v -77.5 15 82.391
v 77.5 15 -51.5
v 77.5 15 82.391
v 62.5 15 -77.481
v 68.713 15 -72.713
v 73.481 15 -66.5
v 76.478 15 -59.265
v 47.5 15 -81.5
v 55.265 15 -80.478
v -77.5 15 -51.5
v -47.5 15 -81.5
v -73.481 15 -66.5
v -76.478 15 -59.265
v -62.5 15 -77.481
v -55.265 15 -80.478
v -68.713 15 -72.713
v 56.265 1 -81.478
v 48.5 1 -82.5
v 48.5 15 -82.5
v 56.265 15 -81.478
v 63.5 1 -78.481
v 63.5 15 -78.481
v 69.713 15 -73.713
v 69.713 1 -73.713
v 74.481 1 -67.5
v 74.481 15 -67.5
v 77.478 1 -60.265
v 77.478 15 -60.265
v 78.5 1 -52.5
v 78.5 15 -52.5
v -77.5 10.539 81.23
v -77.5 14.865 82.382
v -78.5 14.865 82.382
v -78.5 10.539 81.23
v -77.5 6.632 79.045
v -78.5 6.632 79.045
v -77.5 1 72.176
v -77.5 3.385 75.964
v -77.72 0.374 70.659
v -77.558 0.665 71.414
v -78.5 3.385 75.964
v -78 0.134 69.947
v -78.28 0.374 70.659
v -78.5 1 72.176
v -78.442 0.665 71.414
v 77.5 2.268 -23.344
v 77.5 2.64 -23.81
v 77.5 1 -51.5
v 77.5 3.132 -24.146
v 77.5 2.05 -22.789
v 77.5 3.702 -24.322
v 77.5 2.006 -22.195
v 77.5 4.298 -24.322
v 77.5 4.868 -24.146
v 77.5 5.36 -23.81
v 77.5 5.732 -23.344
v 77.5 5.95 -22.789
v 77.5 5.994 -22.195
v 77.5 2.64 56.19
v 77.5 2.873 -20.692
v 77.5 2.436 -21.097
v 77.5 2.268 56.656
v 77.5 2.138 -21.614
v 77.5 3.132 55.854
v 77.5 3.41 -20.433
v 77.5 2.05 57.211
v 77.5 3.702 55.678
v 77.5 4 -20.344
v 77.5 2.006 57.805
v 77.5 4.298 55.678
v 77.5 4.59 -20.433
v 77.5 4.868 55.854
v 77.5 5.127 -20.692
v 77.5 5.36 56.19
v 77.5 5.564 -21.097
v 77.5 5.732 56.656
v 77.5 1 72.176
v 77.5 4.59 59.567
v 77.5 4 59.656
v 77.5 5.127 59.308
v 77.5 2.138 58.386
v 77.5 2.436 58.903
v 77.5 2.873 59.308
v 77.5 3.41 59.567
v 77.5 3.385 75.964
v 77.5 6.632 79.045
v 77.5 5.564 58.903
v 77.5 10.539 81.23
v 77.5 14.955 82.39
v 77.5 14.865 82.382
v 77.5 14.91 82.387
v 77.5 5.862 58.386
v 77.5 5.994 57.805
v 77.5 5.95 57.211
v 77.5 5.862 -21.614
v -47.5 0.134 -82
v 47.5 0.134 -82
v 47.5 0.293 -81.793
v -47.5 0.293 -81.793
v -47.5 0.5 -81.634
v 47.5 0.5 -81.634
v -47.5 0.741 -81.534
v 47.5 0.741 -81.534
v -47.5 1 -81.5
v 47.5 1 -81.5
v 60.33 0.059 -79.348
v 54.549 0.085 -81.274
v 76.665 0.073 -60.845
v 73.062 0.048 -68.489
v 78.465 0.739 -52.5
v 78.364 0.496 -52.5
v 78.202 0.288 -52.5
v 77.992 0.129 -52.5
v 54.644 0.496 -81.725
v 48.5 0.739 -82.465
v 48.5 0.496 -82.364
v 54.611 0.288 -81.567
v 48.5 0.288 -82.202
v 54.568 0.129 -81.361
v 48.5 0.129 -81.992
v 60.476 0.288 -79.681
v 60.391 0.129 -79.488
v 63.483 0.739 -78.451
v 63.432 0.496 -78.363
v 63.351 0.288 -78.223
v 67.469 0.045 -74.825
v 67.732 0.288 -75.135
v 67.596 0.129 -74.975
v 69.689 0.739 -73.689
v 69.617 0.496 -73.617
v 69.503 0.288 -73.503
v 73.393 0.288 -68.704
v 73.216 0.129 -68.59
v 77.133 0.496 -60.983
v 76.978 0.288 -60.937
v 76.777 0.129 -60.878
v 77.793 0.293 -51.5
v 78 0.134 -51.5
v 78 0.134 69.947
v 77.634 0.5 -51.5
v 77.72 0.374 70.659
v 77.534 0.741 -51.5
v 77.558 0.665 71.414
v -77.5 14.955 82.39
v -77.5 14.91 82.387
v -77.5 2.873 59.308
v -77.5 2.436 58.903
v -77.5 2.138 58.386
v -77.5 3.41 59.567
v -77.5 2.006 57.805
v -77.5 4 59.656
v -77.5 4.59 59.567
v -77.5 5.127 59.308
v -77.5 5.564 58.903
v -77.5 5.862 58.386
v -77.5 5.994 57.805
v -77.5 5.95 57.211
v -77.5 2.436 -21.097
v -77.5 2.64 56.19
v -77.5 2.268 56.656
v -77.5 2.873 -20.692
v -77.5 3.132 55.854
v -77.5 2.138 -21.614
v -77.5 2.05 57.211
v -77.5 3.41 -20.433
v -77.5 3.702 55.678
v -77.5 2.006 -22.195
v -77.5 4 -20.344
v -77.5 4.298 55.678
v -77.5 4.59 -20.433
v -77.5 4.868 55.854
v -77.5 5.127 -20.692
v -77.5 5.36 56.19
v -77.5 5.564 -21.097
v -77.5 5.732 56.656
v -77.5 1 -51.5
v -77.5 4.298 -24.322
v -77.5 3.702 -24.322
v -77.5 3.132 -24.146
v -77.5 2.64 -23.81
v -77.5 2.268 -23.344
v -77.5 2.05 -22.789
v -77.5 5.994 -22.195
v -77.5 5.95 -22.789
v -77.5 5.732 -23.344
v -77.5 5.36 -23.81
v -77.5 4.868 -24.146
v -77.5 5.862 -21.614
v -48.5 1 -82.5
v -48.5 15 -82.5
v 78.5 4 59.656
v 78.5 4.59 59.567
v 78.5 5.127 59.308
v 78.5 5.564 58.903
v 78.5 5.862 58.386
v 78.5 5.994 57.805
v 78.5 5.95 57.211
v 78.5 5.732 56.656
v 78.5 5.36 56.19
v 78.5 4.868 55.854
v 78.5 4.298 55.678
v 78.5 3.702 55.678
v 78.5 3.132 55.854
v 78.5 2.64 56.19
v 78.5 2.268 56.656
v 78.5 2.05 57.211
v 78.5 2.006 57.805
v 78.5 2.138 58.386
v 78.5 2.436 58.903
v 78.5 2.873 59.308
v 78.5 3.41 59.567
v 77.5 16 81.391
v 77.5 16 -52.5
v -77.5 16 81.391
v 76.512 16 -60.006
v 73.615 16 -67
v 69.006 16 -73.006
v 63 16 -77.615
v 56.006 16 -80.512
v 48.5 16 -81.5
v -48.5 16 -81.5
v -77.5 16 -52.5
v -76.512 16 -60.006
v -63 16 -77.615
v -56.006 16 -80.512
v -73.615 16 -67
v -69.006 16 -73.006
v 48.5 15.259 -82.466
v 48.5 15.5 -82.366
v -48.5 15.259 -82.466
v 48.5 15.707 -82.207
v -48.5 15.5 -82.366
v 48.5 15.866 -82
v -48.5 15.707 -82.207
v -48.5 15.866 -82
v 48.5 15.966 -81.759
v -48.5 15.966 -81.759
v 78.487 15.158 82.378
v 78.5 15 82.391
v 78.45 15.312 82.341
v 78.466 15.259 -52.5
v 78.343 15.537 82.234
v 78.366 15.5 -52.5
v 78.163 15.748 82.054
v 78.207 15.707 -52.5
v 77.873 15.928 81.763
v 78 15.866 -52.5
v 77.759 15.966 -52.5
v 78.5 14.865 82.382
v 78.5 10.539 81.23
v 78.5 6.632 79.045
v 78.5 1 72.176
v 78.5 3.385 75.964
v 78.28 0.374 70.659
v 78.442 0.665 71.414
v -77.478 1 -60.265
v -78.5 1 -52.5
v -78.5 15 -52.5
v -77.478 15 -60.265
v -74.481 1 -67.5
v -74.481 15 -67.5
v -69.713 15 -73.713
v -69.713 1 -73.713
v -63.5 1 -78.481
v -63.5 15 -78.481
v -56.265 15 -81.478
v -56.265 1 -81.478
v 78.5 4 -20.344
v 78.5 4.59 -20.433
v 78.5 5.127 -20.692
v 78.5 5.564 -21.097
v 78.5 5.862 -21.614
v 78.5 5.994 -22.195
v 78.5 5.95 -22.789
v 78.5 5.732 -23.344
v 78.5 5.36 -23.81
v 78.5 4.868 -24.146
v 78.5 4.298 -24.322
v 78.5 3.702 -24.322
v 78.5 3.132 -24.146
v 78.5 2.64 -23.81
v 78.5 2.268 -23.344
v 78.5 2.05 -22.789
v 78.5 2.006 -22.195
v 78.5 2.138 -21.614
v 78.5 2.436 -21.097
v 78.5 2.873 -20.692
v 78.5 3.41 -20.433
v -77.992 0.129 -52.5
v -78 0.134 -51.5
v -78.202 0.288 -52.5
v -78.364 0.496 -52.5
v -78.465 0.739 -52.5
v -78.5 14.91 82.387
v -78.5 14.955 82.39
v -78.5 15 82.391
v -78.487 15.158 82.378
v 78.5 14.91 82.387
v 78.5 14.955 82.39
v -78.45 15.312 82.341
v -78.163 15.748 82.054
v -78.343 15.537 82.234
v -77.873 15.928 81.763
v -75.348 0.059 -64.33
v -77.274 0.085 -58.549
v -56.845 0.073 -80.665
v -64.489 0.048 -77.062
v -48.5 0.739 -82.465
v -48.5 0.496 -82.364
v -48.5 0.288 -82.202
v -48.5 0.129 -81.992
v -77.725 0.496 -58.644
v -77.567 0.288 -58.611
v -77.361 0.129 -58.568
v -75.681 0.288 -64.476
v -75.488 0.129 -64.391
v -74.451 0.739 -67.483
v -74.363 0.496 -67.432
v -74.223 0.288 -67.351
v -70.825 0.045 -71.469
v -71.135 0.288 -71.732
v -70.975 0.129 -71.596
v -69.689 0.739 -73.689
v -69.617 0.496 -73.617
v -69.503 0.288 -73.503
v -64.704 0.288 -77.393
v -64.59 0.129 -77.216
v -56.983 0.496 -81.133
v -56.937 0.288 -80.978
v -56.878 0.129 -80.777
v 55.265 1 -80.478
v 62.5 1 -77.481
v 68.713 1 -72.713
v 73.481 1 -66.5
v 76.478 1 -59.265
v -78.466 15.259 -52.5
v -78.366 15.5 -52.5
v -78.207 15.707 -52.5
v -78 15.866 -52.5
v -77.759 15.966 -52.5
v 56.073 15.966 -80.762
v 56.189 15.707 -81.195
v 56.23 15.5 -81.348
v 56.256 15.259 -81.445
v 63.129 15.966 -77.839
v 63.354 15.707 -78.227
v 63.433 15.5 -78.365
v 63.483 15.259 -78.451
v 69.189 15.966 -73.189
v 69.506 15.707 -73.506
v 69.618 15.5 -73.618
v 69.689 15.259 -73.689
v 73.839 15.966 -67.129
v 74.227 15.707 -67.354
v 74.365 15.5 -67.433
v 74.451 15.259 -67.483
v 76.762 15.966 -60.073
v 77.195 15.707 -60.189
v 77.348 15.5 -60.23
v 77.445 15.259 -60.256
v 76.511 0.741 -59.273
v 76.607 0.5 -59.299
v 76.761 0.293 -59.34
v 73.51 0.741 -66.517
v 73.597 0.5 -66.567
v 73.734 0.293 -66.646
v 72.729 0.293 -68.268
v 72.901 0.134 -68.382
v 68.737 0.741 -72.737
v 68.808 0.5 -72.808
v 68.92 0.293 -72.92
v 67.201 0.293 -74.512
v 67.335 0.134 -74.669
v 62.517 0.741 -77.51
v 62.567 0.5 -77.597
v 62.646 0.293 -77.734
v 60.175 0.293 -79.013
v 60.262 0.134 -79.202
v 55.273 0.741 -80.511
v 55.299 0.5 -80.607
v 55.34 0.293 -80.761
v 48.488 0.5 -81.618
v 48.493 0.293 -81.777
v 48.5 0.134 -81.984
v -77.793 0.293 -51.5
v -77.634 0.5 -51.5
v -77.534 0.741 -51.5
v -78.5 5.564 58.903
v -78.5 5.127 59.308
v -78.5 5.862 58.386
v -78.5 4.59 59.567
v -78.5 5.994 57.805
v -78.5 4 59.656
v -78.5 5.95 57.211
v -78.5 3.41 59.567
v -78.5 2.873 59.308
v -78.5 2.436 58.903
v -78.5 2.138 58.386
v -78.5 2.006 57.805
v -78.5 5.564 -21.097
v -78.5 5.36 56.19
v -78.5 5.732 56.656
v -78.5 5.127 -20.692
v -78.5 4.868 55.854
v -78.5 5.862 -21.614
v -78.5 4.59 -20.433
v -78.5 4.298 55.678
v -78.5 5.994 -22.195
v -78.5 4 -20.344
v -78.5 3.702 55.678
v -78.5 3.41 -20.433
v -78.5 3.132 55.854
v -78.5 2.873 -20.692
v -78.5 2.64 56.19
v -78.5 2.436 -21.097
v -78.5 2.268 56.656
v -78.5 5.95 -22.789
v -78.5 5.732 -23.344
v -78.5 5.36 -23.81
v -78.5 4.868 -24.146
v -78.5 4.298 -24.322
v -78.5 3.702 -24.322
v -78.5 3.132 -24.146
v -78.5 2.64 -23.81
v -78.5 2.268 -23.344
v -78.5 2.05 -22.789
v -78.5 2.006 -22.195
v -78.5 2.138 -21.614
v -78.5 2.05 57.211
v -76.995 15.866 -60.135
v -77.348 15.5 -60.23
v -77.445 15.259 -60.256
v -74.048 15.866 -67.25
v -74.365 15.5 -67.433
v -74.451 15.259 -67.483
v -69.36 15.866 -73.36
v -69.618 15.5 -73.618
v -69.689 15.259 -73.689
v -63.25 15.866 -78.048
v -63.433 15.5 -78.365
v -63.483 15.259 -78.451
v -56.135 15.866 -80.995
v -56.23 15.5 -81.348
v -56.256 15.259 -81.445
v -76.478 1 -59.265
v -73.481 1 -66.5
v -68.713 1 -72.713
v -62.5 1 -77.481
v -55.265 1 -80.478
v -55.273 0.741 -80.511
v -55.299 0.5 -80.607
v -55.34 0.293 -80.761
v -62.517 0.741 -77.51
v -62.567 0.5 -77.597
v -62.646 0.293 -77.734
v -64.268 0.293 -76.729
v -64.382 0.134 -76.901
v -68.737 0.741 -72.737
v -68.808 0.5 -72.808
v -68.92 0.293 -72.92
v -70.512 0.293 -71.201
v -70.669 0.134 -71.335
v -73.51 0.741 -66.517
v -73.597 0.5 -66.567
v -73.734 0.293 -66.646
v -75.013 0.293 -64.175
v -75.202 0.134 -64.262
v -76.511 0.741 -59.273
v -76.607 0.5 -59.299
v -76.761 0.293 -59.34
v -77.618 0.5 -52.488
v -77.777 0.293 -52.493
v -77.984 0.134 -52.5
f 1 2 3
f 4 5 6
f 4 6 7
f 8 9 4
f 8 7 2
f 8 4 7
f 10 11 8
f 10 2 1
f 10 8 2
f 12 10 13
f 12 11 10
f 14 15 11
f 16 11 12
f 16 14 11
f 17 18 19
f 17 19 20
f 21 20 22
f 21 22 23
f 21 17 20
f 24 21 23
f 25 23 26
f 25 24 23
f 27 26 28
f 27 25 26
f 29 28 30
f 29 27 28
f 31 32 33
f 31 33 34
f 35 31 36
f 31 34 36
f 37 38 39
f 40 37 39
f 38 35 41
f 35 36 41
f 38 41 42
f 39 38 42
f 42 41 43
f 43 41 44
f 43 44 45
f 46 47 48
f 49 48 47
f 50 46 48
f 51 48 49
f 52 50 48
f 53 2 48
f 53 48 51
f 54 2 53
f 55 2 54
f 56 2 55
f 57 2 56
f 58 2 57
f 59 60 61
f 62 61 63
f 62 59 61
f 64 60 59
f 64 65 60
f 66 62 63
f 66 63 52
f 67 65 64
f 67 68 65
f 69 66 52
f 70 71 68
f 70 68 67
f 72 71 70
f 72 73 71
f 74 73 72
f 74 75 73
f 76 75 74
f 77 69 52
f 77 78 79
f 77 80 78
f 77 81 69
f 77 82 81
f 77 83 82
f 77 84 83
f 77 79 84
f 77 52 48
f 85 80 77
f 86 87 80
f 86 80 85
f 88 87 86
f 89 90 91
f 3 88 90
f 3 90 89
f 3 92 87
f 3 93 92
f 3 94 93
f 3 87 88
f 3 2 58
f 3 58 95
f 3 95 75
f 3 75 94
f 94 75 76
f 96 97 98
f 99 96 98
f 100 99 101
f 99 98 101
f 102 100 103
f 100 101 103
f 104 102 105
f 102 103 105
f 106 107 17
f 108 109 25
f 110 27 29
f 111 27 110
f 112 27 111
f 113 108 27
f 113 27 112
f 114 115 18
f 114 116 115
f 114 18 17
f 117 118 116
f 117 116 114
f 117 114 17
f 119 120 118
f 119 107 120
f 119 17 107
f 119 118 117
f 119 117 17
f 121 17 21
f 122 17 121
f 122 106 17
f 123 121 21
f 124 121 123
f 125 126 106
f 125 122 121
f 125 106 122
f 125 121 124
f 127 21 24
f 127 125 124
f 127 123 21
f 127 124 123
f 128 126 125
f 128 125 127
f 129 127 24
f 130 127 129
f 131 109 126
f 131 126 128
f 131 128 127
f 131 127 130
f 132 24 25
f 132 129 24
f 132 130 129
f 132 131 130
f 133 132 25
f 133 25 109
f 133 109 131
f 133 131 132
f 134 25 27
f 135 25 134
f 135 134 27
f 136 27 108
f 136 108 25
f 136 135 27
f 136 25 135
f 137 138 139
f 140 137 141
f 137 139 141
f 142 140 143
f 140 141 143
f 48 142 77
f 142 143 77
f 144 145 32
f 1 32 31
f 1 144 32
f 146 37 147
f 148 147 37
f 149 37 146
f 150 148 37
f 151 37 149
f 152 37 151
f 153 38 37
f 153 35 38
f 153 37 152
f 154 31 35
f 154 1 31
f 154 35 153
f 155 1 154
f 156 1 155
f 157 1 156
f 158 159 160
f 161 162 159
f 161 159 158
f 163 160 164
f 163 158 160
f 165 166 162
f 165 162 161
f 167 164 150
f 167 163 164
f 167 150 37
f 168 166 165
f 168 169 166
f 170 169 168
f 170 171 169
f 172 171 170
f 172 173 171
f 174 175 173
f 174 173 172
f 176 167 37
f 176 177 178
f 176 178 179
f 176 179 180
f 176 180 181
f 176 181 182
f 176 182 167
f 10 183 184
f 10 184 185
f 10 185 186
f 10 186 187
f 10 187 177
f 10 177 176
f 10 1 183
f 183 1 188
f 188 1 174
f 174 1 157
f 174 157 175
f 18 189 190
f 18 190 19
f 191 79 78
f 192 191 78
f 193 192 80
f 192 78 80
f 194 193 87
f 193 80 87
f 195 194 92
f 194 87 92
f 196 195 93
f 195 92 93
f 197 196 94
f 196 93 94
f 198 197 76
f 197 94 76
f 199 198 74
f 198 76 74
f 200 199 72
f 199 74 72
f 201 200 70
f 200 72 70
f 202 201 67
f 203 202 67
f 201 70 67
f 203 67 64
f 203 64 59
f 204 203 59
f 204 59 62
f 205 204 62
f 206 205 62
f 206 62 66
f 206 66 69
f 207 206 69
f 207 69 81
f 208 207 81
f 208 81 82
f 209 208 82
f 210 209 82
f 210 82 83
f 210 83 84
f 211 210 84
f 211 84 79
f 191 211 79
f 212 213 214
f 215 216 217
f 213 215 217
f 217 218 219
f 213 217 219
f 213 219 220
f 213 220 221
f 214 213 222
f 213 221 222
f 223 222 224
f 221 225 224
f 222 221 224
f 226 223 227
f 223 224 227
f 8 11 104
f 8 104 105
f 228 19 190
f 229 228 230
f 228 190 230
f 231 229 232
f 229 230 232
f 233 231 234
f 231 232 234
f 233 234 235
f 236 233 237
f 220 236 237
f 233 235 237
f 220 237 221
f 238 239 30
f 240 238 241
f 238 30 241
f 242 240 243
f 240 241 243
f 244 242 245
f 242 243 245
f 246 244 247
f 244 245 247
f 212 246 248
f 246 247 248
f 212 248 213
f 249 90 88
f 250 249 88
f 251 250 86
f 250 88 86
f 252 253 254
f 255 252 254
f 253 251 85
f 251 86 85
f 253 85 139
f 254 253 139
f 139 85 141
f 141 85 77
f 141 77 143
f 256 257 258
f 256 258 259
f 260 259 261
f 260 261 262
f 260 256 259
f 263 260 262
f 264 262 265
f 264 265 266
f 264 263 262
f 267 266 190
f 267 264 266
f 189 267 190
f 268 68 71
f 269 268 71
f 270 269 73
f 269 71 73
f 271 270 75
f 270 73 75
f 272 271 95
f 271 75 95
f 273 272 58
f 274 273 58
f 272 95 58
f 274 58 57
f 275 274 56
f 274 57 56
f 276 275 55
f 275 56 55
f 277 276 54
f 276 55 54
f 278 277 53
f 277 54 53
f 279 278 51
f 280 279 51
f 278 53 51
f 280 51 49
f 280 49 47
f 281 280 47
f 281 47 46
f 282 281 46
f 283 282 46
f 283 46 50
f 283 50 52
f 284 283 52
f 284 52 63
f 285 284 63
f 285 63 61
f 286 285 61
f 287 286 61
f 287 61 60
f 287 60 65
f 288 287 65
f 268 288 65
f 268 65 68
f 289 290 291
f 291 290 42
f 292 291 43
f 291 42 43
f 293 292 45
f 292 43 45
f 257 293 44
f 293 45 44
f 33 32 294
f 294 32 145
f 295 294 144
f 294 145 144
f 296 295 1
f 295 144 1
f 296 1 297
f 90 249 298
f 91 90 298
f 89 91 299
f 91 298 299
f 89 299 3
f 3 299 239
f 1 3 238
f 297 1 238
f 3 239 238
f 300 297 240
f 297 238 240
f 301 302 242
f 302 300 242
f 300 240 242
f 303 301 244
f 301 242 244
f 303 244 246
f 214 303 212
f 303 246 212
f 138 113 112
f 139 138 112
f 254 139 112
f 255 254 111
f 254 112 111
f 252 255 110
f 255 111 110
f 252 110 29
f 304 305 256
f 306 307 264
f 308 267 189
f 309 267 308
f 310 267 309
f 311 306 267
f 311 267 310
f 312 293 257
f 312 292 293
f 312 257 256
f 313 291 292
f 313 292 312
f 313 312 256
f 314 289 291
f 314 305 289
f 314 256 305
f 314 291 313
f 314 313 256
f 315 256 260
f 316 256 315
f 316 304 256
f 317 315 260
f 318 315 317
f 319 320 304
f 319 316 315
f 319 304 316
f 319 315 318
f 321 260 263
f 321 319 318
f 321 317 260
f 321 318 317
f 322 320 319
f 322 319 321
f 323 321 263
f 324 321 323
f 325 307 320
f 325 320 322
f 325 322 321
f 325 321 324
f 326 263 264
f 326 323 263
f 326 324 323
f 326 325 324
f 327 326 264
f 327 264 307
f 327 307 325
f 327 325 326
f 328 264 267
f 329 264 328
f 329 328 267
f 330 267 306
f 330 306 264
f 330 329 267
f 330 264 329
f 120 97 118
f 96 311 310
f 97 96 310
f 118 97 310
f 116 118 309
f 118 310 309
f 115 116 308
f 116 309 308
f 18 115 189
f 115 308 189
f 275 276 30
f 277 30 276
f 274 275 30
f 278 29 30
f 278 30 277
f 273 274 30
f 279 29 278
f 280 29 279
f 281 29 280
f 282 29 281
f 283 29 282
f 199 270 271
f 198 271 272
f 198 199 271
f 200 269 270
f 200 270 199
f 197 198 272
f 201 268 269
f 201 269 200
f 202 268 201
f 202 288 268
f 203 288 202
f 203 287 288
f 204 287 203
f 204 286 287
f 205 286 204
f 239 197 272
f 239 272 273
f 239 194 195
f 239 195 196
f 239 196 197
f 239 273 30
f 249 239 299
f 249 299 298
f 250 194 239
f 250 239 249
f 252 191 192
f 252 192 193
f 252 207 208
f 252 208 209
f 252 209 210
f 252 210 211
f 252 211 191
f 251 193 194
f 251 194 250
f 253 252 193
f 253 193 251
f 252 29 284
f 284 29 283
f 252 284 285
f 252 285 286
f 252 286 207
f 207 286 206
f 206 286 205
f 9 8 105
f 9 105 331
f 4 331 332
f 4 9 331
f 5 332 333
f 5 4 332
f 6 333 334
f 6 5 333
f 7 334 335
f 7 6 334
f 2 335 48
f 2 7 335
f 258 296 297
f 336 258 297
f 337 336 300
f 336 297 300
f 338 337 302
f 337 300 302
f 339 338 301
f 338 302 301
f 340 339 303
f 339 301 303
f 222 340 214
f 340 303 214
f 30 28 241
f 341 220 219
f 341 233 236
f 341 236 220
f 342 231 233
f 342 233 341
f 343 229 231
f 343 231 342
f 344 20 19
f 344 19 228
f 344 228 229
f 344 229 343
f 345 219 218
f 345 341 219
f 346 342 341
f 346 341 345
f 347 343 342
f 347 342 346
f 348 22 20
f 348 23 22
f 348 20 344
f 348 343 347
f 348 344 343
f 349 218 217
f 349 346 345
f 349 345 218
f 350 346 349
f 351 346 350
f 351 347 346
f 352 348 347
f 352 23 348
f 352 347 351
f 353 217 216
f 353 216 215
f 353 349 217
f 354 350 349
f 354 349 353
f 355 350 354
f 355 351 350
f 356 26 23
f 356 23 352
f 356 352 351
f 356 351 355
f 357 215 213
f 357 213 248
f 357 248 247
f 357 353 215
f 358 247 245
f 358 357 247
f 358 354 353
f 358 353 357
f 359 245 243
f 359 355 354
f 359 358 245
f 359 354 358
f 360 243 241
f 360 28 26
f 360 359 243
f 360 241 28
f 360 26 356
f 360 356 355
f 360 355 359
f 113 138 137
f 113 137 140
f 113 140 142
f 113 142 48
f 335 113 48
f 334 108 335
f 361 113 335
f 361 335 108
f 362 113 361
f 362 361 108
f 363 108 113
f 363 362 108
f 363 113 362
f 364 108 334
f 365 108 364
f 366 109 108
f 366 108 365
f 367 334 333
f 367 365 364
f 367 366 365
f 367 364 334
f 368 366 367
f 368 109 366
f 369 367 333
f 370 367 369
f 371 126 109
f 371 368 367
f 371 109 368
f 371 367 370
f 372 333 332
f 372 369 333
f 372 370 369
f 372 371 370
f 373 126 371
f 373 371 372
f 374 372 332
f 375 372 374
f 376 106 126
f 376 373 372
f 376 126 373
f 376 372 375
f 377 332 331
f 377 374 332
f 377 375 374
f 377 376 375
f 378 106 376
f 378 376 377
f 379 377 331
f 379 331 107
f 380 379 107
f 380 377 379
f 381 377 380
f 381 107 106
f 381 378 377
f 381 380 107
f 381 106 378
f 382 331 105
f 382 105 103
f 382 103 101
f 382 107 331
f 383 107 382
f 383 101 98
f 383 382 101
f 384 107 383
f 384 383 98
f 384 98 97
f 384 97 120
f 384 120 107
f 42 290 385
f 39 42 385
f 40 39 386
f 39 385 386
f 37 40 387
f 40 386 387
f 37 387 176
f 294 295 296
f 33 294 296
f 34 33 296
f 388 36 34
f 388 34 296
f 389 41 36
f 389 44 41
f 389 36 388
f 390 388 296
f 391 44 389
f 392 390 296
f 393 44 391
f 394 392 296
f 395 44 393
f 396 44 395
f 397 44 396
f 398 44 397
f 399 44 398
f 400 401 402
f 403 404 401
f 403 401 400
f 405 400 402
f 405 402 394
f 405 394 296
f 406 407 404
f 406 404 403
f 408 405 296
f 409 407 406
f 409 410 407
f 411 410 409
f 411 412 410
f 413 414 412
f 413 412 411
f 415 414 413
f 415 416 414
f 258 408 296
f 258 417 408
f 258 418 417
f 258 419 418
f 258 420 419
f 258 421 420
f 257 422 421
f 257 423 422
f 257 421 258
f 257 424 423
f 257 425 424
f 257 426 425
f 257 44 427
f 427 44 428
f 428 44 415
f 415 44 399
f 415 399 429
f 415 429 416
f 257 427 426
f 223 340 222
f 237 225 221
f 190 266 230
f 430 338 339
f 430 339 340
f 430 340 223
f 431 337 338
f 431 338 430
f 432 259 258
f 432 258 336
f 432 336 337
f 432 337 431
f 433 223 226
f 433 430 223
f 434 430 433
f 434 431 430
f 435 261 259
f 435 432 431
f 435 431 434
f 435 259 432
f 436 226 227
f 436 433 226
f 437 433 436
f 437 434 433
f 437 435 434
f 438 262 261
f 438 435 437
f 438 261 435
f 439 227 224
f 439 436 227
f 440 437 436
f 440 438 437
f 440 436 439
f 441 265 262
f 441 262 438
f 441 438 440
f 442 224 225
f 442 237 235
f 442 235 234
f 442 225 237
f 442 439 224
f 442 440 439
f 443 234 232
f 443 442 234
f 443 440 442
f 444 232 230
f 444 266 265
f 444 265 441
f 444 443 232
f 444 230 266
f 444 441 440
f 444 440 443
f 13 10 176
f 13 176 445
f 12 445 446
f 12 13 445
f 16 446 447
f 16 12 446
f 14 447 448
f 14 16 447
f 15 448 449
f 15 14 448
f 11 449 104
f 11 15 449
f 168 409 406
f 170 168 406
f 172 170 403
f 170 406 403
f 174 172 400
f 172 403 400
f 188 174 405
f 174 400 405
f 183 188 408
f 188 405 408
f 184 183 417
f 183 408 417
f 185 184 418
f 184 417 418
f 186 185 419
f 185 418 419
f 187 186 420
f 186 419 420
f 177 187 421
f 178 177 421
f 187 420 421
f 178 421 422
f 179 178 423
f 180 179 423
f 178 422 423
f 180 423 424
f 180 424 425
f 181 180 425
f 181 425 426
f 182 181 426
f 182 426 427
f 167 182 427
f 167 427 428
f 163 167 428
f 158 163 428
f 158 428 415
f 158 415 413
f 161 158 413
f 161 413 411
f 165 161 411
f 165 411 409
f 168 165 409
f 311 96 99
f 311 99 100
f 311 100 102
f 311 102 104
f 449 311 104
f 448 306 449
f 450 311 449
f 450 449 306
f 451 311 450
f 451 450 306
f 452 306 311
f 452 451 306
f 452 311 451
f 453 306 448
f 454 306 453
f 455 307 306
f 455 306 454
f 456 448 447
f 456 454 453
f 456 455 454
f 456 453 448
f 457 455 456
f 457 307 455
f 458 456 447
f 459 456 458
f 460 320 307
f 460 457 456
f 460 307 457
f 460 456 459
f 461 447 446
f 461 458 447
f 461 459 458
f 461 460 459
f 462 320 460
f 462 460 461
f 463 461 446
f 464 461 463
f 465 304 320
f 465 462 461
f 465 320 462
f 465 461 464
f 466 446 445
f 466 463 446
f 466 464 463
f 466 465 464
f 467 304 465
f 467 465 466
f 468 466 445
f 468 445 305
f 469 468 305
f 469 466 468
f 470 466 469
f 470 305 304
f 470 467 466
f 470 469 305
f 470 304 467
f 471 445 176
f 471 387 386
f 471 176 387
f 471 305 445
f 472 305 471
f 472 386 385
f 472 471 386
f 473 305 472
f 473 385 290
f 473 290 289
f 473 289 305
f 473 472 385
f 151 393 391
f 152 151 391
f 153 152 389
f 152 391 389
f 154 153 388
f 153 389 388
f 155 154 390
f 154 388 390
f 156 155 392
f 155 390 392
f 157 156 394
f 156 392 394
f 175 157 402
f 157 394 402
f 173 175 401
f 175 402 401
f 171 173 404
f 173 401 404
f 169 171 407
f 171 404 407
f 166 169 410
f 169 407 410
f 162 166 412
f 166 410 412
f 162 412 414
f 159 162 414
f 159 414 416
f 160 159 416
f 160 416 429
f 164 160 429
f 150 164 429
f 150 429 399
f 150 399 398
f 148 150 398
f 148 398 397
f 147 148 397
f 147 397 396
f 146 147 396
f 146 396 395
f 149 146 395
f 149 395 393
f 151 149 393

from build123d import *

# Parameters (mm, degrees)
BOSS_EXTRUDE1_DEPTH = 16
CUT_EXTRUDE1_START  = -1
CUT_EXTRUDE1_DEPTH  = 25
SKETCH5_R           = 2.000000000000003
CUT_EXTRUDE3_DEPTH  = 179.07652849266802
CUT_EXTRUDE4_DEPTH  = 179.07652849266802
FILLET1_R           = 1


with BuildPart() as part:
    # Sketch1 → Boss-Extrude1 (new body)
    with BuildSketch(Plane(origin=(0, 0, 0), x_dir=(1, 0, 0), z_dir=(0, 1, 0))):
        with BuildLine():
            Line((-48.499999999999986, 82.49999999999999), (48.500000000000014, 82.50000000000001))
            ThreePointArc((48.500000000000014, 82.50000000000001), (69.71320343559644, 73.71320343559644), (78.5, 52.500000000000014))
            Line((78.5, 52.500000000000014), (78.50000000000003, -82.5))
            Line((78.50000000000003, -82.5), (-78.49999999999997, -82.5))
            Line((-78.49999999999997, -82.5), (-78.5, 52.5))
            ThreePointArc((-78.5, 52.5), (-69.7132034355964, 73.71320343559643), (-48.499999999999986, 82.49999999999999))
        make_face()
    extrude(amount=BOSS_EXTRUDE1_DEPTH)

    # Sketch2 → Cut-Extrude1 (cut)
    with BuildSketch(Plane(origin=(0, 16, 0), x_dir=(1, 0, 0), z_dir=(0, 1, 0)).offset(CUT_EXTRUDE1_START)):
        with BuildLine():
            Line((-47.5, 81.5), (47.50000000000003, 81.50000000000003))
            ThreePointArc((47.50000000000003, 81.50000000000003), (68.71320343559645, 72.71320343559645), (77.50000000000003, 51.50000000000003))
            Line((77.50000000000003, 51.50000000000003), (77.50000000000004, -81.50000000000006))
            Line((77.50000000000004, -81.50000000000006), (77.50000000000006, -82.5))
            Line((77.50000000000006, -82.5), (75.39281372987732, -82.49999999999999))
            Line((75.39281372987732, -82.49999999999999), (-77.49999999999997, -82.5))
            Line((-77.49999999999997, -82.5), (-77.49999999999997, -81.49999999999997))
            Line((-77.49999999999997, -81.49999999999997), (-77.49999999999999, 51.500000000000014))
            ThreePointArc((-77.49999999999999, 51.500000000000014), (-68.71320343559641, 72.71320343559643), (-47.5, 81.5))
        make_face()
    extrude(amount=-CUT_EXTRUDE1_DEPTH, mode=Mode.SUBTRACT)

    # Sketch5 → Cut-Extrude3 (cut, through all)
    with BuildSketch(Plane.ZY.offset(78.49999999999999)):
        with Locations((-22.344222660164835, 4)):
            Circle(SKETCH5_R)
        with Locations((57.65577733983517, 4)):
            Circle(SKETCH5_R)
    extrude(amount=-CUT_EXTRUDE3_DEPTH, mode=Mode.SUBTRACT)

    # Sketch6 → Cut-Extrude4 (cut, through all)
    with BuildSketch(Plane.ZY.offset(78.49999999999999)):
        with BuildLine():
            ThreePointArc((82.49999999999999, 16), (78.51986342800406, 5.952610964746691), (69.49999999999999, -3.55e-15))
            Line((69.49999999999999, 0), (82.49999999999999, 0))
            Line((82.49999999999999, 0), (82.49999999999999, 16))
        make_face()
    extrude(amount=-CUT_EXTRUDE4_DEPTH, mode=Mode.SUBTRACT)

    # Fillet1
    # the kernel refuses this fillet: 1 mm, written as the material it takes off along each edge
    with BuildSketch(Plane(origin=(77.50000000000004, 0, 73.74999999999997), x_dir=(1, 0, -1.1e-16), z_dir=(-1.1e-16, 0, -1)), Plane(origin=(-77.49999999999997, 0, -51.5), x_dir=(-1, 0, 0), z_dir=(0, 0, 1))) as fillet1_piece_1:
        with BuildLine():
            CenterArc((FILLET1_R, -FILLET1_R), FILLET1_R, 90, 90)
            Line((0, -FILLET1_R), (0, 0))
            Line((0, 0), (FILLET1_R, 0))
        make_face()
    extrude(amount=125.25, mode=Mode.SUBTRACT)
    with BuildSketch(Plane(origin=(47.50000000000003, 0, -51.50000000000003), x_dir=(1, 0, 2.4e-16), z_dir=(-2.4e-16, 0, 1))) as fillet1_piece_2:
        with BuildLine():
            CenterArc((30 + FILLET1_R, FILLET1_R), FILLET1_R, 180, 90)
            Line((30, FILLET1_R), (30, 0))
            Line((30, 0), (30 + FILLET1_R, 0))
        make_face()
    revolve(axis=Axis((47.50000000000003, 0, -51.50000000000003), (0, 1, 0)), revolution_arc=90, mode=Mode.SUBTRACT)
    with BuildSketch(Plane(origin=(47.50000000000003, 0, -81.50000000000003), x_dir=(-3e-16, 0, -1), z_dir=(-1, 0, 3e-16))) as fillet1_piece_3:
        with BuildLine():
            CenterArc((FILLET1_R, -FILLET1_R), FILLET1_R, 90, 90)
            Line((0, -FILLET1_R), (0, 0))
            Line((0, 0), (FILLET1_R, 0))
        make_face()
    extrude(amount=95.00000000000003, mode=Mode.SUBTRACT)
    with BuildSketch(Plane(origin=(-47.499999999999986, 0, -51.5), x_dir=(-2.4e-16, 0, -1), z_dir=(1, 0, -2.4e-16))) as fillet1_piece_4:
        with BuildLine():
            CenterArc((30 + FILLET1_R, FILLET1_R), FILLET1_R, 180, 90)
            Line((30, FILLET1_R), (30, 0))
            Line((30, 0), (30 + FILLET1_R, 0))
        make_face()
    revolve(axis=Axis((-47.499999999999986, 0, -51.5), (0, 1, 0)), revolution_arc=89.99999999999994, mode=Mode.SUBTRACT)
    with BuildSketch(Plane(origin=(78.5, 0, -52.500000000000014), x_dir=(-1, 0, 2.1e-16), z_dir=(2.1e-16, 0, 1))) as fillet1_piece_5:
        with BuildLine():
            CenterArc((FILLET1_R, -FILLET1_R), FILLET1_R, 90, 90)
            Line((0, -FILLET1_R), (0, 0))
            Line((0, 0), (FILLET1_R, 0))
        make_face()
    extrude(amount=126.24999999999999, mode=Mode.SUBTRACT)
    with BuildSketch(Plane(origin=(48.50000000000004, 0, -52.50000000000006), x_dir=(-9.5e-16, 0, -1), z_dir=(-1, 0, 9.5e-16))) as fillet1_piece_6:
        with BuildLine():
            CenterArc((29.999999999999943 - FILLET1_R, -FILLET1_R), FILLET1_R, 1.272e-14, 90)
            Line((29.999999999999943, -FILLET1_R), (29.999999999999943, 0))
            Line((29.999999999999943, 0), (29.999999999999943 - FILLET1_R, 0))
        make_face()
    revolve(axis=Axis((48.50000000000004, 0, -52.50000000000006), (0, -1, 0)), revolution_arc=90.00000000000014, mode=Mode.SUBTRACT)
    with BuildSketch(Plane(origin=(-48.499999999999986, 0, -82.49999999999999), x_dir=(0, 1, 0), z_dir=(1, 0, -2.9e-16))) as fillet1_piece_7:
        with BuildLine():
            CenterArc((FILLET1_R, FILLET1_R), FILLET1_R, 180, 90)
            Line((-1.1e-16, FILLET1_R), (0, 0))
            Line((0, 0), (FILLET1_R, 0))
        make_face()
    extrude(amount=97, mode=Mode.SUBTRACT)
    with BuildSketch(Plane(origin=(-48.49999999999997, 0, -52.49999999999995), x_dir=(-1, 0, -1.66e-15), z_dir=(-1.66e-15, 0, 1))) as fillet1_piece_8:
        with BuildLine():
            CenterArc((30.00000000000003 - FILLET1_R, -FILLET1_R), FILLET1_R, 0, 90)
            Line((30.00000000000003 - FILLET1_R, 1.1e-16), (30.00000000000003, 0))
            Line((30.00000000000003, 0), (30.00000000000003, -FILLET1_R))
        make_face()
    revolve(axis=Axis((-48.49999999999997, 0, -52.49999999999995), (0, -1, 0)), revolution_arc=89.99999999999989, mode=Mode.SUBTRACT)
    with BuildSketch(Plane(origin=(-78.49999999999997, 16, 85), x_dir=(0, -1, 0), z_dir=(-2.1e-16, 0, -1))) as fillet1_piece_9:
        with BuildLine():
            CenterArc((FILLET1_R, -FILLET1_R), FILLET1_R, 90, 90)
            Line((0, -FILLET1_R), (0, 0))
            Line((0, 0), (FILLET1_R, 0))
        make_face()
    extrude(amount=137.5, mode=Mode.SUBTRACT)
    with BuildSketch(Plane(origin=(-48.49999999999997, 16, -52.49999999999995), x_dir=(-1, 0, -1.66e-15), z_dir=(-1.66e-15, 0, 1))) as fillet1_piece_10:
        with BuildLine():
            CenterArc((30.00000000000003 - FILLET1_R, FILLET1_R), FILLET1_R, 270, 90)
            Line((30.00000000000003 - FILLET1_R, 0), (30.00000000000003, 0))
            Line((30.00000000000003, 0), (30.00000000000003, FILLET1_R))
        make_face()
    revolve(axis=Axis((-48.49999999999997, 16, -52.49999999999995), (0, -1, 0)), revolution_arc=89.99999999999989, mode=Mode.SUBTRACT)
    with BuildSketch(Plane(origin=(-48.499999999999986, 16, -82.49999999999999), x_dir=(0, -1, 0), z_dir=(1, 0, -2.9e-16))) as fillet1_piece_11:
        with BuildLine():
            CenterArc((FILLET1_R, -FILLET1_R), FILLET1_R, 90, 90)
            Line((0, -FILLET1_R), (0, 0))
            Line((0, 0), (FILLET1_R, 0))
        make_face()
    extrude(amount=97, mode=Mode.SUBTRACT)
    with BuildSketch(Plane(origin=(48.50000000000004, 16, -52.50000000000006), x_dir=(-9.5e-16, 0, -1), z_dir=(-1, 0, 9.5e-16))) as fillet1_piece_12:
        with BuildLine():
            CenterArc((29.999999999999943 - FILLET1_R, FILLET1_R), FILLET1_R, 270, 90)
            Line((29.999999999999943, FILLET1_R), (29.999999999999943, 0))
            Line((29.999999999999943, 0), (29.999999999999943 - FILLET1_R, 0))
        make_face()
    revolve(axis=Axis((48.50000000000004, 16, -52.50000000000006), (0, -1, 0)), revolution_arc=90.00000000000014, mode=Mode.SUBTRACT)
    with BuildSketch(Plane(origin=(78.5, 16, -52.500000000000014), x_dir=(-1, 0, 2.1e-16), z_dir=(2.1e-16, 0, 1))) as fillet1_piece_13:
        with BuildLine():
            CenterArc((FILLET1_R, FILLET1_R), FILLET1_R, 180, 90)
            Line((0, FILLET1_R), (0, 0))
            Line((0, 0), (FILLET1_R, 0))
        make_face()
    extrude(amount=137.5, mode=Mode.SUBTRACT)
    with BuildSketch(Plane(origin=(-78.49999999999997, 0, 73.75), x_dir=(0, 1, 0), z_dir=(-2.1e-16, 0, -1))) as fillet1_piece_14:
        with BuildLine():
            CenterArc((FILLET1_R, FILLET1_R), FILLET1_R, 180, 90)
            Line((-1.1e-16, FILLET1_R), (0, 0))
            Line((0, 0), (FILLET1_R, 0))
        make_face()
    extrude(amount=126.25, mode=Mode.SUBTRACT)
    with BuildSketch(Plane(origin=(81.35302601856634, 16, 82.5), x_dir=(0, 0, -1), z_dir=(-1, 0, 0))) as fillet1_piece_15:
        with BuildLine():
            CenterArc((1.1090314143661004, 1), FILLET1_R, 172.23715283019968, 97.76284716980035)
            ThreePointArc((0.11819577889333743, 1.135073104196561), (0.05009298550456265, 0.5684742376371492), (0, 0))
            Line((0, 0), (1.1090314143661004, 0))
        make_face()
    extrude(amount=162.70605203713265, mode=Mode.SUBTRACT)


solid = part.part
